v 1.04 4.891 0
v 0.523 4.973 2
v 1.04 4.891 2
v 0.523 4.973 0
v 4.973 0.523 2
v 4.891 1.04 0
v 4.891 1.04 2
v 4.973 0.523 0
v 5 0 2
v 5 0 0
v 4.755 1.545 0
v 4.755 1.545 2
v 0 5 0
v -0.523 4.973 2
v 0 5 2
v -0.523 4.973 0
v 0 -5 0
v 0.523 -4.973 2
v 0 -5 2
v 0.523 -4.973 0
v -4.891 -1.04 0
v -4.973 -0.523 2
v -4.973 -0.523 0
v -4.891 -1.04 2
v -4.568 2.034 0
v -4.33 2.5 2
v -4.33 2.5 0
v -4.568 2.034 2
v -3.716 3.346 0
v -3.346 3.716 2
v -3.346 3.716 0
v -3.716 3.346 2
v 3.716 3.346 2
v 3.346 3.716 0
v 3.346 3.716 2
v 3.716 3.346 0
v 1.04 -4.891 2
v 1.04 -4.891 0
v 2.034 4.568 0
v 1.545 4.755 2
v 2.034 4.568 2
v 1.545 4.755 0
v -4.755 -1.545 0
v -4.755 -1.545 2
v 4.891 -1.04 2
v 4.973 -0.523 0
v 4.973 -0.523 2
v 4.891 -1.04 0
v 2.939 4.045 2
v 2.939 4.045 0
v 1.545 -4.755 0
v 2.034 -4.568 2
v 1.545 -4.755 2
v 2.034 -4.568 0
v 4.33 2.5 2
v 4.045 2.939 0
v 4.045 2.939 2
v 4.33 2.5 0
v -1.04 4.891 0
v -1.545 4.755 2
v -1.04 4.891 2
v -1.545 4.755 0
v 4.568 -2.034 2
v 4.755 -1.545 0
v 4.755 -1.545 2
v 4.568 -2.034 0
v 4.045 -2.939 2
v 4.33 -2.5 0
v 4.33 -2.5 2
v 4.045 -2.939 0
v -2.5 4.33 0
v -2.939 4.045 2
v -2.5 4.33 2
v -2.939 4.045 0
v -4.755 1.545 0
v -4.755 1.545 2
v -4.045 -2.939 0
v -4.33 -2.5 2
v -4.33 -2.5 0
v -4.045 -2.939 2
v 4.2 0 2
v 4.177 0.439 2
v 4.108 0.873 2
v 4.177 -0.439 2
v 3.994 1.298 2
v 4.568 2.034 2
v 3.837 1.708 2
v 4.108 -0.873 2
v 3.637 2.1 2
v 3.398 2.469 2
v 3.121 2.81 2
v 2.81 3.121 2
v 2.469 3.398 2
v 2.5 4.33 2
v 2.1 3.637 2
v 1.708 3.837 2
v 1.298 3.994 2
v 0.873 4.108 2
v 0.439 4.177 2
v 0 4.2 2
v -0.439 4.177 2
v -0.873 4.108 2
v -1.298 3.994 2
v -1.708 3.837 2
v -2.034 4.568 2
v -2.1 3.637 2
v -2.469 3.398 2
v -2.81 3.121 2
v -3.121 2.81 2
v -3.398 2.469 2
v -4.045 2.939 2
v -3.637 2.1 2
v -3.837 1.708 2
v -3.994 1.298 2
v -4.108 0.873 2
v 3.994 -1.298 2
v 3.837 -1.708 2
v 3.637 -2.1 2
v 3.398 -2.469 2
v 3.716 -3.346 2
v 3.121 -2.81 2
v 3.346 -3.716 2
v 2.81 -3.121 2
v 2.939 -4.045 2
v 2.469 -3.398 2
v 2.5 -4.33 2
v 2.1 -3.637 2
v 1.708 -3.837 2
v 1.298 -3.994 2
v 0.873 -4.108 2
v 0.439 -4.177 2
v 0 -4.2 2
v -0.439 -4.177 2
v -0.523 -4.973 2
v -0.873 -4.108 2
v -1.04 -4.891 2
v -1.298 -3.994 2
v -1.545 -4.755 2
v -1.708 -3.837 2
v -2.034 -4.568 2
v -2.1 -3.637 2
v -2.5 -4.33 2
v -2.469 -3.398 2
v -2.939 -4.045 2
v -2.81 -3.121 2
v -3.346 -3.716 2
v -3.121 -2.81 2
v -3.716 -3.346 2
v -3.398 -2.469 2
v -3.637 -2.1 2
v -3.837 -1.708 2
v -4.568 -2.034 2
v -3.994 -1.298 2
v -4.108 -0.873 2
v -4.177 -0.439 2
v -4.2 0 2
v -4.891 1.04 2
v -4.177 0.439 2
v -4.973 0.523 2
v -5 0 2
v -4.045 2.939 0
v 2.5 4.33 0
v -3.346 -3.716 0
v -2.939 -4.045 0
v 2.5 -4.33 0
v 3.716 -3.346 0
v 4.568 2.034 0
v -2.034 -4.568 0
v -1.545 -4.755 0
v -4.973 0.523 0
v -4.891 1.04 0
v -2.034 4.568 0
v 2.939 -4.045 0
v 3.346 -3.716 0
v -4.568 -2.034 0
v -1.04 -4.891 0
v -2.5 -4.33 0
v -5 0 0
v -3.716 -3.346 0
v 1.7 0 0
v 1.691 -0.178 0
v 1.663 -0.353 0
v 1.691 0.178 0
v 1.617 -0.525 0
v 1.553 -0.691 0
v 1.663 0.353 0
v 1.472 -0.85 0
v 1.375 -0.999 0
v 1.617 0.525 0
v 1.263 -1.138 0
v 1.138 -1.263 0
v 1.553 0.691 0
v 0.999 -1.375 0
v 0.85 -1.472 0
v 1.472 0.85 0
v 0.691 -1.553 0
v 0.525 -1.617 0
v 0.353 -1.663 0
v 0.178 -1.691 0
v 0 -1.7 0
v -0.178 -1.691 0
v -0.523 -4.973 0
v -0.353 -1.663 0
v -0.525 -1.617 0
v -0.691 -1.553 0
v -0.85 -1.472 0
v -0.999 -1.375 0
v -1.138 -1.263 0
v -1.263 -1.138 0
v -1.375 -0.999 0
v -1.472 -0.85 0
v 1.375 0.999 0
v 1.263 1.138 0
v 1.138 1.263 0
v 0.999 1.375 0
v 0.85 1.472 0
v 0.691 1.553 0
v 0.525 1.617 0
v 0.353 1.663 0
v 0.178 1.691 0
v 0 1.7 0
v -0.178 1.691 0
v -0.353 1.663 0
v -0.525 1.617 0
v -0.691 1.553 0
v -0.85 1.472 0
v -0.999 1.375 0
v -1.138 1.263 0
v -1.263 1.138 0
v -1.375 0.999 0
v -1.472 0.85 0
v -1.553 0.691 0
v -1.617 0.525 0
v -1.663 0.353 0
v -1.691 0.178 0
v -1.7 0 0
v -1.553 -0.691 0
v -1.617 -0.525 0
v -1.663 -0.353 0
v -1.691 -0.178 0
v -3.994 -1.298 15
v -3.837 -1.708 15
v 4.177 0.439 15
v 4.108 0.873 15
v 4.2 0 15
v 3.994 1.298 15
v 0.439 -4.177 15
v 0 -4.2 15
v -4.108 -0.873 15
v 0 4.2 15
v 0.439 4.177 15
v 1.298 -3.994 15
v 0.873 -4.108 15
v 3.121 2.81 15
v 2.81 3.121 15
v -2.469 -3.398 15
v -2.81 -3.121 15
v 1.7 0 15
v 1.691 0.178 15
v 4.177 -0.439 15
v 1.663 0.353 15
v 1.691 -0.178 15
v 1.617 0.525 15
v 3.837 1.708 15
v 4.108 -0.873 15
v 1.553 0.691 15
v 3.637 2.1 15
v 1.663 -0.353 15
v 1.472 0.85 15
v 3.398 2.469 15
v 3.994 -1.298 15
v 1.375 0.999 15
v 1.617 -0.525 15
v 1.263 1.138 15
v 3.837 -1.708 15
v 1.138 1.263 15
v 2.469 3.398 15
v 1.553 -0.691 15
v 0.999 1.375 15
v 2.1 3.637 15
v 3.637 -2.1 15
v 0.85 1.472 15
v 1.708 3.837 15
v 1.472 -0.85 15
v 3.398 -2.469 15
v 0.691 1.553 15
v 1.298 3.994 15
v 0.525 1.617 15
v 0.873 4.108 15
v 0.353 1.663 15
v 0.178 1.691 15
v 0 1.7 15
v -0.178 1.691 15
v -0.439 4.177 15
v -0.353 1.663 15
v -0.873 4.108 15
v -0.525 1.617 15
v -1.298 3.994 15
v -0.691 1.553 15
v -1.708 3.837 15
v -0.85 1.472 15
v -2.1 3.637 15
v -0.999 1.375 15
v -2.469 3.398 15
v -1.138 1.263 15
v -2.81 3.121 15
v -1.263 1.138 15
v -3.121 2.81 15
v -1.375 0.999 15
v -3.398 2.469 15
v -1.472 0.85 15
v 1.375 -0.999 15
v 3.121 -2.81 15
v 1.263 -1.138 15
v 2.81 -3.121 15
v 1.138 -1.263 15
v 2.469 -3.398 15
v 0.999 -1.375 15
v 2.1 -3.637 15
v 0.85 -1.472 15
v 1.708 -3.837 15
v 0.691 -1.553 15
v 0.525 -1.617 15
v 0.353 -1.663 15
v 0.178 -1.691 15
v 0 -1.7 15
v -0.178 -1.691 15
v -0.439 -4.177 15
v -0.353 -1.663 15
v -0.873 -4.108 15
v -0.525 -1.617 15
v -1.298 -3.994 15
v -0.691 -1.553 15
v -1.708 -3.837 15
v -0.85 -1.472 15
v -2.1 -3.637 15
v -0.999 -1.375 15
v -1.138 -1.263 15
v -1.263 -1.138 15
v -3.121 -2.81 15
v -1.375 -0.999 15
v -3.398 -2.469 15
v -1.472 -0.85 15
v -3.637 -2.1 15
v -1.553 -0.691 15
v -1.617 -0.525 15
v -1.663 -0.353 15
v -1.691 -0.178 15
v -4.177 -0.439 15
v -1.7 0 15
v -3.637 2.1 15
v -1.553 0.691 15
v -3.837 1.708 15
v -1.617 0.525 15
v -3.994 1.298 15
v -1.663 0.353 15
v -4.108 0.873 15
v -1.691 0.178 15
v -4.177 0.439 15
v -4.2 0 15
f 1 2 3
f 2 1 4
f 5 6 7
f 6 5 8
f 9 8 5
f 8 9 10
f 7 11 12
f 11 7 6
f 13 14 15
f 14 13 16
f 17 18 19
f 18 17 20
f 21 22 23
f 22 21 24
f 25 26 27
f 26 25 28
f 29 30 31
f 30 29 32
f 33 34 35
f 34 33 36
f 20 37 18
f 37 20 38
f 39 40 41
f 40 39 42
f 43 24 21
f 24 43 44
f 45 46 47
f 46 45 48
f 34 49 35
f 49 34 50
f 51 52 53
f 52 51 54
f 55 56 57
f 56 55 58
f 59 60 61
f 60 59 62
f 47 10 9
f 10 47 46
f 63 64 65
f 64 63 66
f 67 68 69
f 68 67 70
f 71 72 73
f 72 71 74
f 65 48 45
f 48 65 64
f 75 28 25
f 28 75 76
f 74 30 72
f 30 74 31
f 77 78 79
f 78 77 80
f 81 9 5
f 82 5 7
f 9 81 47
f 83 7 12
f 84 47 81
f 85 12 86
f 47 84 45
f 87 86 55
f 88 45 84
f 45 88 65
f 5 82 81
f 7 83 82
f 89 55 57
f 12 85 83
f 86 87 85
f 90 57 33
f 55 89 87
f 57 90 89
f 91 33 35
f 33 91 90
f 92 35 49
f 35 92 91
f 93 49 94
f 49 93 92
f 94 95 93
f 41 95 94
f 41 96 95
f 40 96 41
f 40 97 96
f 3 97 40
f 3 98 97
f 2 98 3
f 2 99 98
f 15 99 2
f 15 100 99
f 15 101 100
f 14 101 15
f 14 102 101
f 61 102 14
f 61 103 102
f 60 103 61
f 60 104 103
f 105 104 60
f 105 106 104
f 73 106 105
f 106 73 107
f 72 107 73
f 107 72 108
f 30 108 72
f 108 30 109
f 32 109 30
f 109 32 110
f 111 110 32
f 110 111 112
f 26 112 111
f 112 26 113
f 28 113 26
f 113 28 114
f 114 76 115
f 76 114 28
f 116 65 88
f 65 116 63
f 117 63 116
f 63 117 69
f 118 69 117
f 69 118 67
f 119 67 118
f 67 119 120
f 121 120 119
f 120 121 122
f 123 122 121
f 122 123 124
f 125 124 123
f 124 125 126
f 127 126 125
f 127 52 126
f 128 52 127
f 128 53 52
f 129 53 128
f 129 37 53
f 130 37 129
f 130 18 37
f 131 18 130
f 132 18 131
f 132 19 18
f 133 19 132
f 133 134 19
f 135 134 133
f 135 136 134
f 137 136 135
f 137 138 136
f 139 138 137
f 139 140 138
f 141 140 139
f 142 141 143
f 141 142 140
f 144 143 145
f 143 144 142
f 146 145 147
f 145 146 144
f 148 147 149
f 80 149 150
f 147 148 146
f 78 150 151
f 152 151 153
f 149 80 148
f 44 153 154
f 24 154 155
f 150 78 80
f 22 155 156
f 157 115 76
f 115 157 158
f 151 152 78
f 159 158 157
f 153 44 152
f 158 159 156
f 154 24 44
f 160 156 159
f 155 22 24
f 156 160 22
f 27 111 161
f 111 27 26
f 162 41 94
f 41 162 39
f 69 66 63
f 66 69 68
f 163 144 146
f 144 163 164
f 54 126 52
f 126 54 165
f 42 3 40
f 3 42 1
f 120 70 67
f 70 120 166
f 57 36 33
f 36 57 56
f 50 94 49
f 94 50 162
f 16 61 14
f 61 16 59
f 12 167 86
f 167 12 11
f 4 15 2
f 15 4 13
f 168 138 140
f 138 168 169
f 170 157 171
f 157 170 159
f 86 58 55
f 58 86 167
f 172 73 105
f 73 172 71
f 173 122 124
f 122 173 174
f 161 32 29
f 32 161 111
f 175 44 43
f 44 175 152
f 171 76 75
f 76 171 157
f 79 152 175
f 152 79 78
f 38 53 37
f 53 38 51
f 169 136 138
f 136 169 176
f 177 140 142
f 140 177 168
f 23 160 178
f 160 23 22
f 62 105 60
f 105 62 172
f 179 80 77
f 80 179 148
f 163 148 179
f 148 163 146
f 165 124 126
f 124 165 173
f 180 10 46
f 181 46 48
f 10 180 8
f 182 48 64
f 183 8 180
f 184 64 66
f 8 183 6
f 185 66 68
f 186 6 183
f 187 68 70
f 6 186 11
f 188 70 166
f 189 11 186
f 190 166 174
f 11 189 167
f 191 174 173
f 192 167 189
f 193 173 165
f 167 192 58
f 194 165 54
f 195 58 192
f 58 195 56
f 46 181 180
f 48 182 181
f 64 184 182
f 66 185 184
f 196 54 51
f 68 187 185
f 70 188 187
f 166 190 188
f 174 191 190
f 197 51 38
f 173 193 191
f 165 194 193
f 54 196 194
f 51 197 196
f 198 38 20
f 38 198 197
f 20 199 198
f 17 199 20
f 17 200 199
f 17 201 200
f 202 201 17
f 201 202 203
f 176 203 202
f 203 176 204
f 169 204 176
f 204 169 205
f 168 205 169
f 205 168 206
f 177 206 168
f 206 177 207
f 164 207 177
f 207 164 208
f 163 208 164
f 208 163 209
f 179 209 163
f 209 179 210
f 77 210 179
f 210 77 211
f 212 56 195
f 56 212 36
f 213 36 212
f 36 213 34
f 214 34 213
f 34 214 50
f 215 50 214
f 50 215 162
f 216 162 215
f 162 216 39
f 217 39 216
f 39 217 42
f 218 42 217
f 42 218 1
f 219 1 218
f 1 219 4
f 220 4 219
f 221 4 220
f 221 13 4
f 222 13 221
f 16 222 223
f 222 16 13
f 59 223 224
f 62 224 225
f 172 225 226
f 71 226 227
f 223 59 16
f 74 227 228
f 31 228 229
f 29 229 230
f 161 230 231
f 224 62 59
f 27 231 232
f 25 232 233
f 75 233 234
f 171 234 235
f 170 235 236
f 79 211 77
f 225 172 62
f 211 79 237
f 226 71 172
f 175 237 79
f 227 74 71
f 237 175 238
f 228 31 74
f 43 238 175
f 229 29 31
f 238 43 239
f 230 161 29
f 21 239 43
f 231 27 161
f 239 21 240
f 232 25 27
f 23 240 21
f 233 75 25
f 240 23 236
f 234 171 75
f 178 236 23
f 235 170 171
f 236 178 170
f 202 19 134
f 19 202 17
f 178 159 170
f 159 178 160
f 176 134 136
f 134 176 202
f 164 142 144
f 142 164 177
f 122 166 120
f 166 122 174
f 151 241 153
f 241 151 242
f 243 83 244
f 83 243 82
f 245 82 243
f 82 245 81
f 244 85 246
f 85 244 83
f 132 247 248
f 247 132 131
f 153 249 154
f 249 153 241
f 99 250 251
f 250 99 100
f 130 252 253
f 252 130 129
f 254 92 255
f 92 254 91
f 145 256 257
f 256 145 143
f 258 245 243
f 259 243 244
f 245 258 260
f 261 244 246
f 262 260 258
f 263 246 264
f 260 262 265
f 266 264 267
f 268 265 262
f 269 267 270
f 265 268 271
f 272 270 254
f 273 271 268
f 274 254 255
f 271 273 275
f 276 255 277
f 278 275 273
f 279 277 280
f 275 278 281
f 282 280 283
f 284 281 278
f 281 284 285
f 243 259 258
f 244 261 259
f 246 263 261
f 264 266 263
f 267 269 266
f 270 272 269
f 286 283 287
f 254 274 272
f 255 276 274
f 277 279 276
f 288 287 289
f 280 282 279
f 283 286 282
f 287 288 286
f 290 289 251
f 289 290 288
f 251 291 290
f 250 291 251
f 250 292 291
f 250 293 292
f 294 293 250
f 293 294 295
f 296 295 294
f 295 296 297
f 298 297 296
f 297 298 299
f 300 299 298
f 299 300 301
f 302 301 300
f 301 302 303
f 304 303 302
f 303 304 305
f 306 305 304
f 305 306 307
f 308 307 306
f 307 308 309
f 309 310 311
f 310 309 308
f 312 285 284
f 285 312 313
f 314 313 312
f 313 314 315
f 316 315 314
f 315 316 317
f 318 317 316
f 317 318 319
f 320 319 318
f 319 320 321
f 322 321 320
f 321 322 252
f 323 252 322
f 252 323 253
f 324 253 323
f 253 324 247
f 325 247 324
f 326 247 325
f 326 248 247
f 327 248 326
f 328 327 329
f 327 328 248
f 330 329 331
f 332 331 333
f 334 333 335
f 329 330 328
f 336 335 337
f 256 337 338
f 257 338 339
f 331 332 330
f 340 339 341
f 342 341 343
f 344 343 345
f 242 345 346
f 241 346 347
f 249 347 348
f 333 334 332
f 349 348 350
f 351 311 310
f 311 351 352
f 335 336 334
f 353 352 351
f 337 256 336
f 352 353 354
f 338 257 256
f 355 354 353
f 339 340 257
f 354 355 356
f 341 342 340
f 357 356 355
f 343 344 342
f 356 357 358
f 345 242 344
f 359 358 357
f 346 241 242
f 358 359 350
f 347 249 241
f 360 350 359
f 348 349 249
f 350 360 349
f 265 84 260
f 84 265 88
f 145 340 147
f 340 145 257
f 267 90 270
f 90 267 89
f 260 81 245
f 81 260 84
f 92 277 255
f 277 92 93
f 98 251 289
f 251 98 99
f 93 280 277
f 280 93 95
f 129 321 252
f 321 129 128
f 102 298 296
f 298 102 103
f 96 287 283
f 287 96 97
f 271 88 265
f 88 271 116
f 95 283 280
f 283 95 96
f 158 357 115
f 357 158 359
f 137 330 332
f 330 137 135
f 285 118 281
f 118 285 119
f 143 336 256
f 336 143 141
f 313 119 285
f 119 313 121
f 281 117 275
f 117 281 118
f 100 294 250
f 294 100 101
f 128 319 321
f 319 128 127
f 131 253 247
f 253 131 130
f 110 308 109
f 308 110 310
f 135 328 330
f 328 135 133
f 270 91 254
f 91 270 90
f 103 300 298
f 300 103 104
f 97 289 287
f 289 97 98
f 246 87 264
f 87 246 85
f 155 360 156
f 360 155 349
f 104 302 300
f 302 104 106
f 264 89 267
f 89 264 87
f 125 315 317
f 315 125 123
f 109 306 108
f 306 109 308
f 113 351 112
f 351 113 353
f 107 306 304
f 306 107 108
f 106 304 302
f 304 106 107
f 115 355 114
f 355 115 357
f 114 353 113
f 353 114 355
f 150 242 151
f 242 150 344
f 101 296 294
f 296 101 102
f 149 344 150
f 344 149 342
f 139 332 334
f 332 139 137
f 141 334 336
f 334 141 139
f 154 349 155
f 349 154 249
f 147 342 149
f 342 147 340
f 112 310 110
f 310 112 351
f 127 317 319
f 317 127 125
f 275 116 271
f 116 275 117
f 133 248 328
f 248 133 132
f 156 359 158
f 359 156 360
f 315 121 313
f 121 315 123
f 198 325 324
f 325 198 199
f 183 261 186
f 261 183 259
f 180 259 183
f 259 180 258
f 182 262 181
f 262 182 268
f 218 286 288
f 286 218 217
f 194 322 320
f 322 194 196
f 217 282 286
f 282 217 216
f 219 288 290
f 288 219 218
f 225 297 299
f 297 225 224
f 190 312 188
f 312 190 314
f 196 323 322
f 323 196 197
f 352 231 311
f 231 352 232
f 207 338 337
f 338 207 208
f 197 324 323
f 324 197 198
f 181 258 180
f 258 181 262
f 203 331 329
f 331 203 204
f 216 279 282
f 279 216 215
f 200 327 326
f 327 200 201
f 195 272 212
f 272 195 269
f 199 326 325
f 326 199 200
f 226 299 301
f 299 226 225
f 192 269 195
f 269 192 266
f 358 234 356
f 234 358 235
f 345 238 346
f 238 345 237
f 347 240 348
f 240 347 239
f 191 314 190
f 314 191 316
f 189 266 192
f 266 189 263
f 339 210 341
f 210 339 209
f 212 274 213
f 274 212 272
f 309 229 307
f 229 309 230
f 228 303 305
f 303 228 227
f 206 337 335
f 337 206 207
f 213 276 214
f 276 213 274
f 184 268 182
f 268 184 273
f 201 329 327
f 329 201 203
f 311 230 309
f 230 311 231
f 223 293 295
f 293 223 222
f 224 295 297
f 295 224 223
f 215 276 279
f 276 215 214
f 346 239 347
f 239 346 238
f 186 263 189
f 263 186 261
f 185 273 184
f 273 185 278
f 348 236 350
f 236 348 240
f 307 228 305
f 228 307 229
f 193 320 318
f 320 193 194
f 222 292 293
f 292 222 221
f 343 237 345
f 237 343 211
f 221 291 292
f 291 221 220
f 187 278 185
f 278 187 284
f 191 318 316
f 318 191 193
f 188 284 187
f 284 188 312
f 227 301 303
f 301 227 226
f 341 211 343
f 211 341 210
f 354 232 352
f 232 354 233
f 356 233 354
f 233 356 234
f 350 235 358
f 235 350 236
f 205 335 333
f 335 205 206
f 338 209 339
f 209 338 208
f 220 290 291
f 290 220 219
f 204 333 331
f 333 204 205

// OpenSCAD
// PCB standoff with mounting base.
$fn = 60;
eps = 0.02;
thread_d = 3.4;
base_d = 10;
height = 15;
body_d = thread_d+5;
difference() {
    union() { cylinder(d=base_d,h=2); cylinder(d=body_d,h=height); }
    translate([0,0,-eps]) cylinder(d=thread_d,h=height+2*eps);
}
